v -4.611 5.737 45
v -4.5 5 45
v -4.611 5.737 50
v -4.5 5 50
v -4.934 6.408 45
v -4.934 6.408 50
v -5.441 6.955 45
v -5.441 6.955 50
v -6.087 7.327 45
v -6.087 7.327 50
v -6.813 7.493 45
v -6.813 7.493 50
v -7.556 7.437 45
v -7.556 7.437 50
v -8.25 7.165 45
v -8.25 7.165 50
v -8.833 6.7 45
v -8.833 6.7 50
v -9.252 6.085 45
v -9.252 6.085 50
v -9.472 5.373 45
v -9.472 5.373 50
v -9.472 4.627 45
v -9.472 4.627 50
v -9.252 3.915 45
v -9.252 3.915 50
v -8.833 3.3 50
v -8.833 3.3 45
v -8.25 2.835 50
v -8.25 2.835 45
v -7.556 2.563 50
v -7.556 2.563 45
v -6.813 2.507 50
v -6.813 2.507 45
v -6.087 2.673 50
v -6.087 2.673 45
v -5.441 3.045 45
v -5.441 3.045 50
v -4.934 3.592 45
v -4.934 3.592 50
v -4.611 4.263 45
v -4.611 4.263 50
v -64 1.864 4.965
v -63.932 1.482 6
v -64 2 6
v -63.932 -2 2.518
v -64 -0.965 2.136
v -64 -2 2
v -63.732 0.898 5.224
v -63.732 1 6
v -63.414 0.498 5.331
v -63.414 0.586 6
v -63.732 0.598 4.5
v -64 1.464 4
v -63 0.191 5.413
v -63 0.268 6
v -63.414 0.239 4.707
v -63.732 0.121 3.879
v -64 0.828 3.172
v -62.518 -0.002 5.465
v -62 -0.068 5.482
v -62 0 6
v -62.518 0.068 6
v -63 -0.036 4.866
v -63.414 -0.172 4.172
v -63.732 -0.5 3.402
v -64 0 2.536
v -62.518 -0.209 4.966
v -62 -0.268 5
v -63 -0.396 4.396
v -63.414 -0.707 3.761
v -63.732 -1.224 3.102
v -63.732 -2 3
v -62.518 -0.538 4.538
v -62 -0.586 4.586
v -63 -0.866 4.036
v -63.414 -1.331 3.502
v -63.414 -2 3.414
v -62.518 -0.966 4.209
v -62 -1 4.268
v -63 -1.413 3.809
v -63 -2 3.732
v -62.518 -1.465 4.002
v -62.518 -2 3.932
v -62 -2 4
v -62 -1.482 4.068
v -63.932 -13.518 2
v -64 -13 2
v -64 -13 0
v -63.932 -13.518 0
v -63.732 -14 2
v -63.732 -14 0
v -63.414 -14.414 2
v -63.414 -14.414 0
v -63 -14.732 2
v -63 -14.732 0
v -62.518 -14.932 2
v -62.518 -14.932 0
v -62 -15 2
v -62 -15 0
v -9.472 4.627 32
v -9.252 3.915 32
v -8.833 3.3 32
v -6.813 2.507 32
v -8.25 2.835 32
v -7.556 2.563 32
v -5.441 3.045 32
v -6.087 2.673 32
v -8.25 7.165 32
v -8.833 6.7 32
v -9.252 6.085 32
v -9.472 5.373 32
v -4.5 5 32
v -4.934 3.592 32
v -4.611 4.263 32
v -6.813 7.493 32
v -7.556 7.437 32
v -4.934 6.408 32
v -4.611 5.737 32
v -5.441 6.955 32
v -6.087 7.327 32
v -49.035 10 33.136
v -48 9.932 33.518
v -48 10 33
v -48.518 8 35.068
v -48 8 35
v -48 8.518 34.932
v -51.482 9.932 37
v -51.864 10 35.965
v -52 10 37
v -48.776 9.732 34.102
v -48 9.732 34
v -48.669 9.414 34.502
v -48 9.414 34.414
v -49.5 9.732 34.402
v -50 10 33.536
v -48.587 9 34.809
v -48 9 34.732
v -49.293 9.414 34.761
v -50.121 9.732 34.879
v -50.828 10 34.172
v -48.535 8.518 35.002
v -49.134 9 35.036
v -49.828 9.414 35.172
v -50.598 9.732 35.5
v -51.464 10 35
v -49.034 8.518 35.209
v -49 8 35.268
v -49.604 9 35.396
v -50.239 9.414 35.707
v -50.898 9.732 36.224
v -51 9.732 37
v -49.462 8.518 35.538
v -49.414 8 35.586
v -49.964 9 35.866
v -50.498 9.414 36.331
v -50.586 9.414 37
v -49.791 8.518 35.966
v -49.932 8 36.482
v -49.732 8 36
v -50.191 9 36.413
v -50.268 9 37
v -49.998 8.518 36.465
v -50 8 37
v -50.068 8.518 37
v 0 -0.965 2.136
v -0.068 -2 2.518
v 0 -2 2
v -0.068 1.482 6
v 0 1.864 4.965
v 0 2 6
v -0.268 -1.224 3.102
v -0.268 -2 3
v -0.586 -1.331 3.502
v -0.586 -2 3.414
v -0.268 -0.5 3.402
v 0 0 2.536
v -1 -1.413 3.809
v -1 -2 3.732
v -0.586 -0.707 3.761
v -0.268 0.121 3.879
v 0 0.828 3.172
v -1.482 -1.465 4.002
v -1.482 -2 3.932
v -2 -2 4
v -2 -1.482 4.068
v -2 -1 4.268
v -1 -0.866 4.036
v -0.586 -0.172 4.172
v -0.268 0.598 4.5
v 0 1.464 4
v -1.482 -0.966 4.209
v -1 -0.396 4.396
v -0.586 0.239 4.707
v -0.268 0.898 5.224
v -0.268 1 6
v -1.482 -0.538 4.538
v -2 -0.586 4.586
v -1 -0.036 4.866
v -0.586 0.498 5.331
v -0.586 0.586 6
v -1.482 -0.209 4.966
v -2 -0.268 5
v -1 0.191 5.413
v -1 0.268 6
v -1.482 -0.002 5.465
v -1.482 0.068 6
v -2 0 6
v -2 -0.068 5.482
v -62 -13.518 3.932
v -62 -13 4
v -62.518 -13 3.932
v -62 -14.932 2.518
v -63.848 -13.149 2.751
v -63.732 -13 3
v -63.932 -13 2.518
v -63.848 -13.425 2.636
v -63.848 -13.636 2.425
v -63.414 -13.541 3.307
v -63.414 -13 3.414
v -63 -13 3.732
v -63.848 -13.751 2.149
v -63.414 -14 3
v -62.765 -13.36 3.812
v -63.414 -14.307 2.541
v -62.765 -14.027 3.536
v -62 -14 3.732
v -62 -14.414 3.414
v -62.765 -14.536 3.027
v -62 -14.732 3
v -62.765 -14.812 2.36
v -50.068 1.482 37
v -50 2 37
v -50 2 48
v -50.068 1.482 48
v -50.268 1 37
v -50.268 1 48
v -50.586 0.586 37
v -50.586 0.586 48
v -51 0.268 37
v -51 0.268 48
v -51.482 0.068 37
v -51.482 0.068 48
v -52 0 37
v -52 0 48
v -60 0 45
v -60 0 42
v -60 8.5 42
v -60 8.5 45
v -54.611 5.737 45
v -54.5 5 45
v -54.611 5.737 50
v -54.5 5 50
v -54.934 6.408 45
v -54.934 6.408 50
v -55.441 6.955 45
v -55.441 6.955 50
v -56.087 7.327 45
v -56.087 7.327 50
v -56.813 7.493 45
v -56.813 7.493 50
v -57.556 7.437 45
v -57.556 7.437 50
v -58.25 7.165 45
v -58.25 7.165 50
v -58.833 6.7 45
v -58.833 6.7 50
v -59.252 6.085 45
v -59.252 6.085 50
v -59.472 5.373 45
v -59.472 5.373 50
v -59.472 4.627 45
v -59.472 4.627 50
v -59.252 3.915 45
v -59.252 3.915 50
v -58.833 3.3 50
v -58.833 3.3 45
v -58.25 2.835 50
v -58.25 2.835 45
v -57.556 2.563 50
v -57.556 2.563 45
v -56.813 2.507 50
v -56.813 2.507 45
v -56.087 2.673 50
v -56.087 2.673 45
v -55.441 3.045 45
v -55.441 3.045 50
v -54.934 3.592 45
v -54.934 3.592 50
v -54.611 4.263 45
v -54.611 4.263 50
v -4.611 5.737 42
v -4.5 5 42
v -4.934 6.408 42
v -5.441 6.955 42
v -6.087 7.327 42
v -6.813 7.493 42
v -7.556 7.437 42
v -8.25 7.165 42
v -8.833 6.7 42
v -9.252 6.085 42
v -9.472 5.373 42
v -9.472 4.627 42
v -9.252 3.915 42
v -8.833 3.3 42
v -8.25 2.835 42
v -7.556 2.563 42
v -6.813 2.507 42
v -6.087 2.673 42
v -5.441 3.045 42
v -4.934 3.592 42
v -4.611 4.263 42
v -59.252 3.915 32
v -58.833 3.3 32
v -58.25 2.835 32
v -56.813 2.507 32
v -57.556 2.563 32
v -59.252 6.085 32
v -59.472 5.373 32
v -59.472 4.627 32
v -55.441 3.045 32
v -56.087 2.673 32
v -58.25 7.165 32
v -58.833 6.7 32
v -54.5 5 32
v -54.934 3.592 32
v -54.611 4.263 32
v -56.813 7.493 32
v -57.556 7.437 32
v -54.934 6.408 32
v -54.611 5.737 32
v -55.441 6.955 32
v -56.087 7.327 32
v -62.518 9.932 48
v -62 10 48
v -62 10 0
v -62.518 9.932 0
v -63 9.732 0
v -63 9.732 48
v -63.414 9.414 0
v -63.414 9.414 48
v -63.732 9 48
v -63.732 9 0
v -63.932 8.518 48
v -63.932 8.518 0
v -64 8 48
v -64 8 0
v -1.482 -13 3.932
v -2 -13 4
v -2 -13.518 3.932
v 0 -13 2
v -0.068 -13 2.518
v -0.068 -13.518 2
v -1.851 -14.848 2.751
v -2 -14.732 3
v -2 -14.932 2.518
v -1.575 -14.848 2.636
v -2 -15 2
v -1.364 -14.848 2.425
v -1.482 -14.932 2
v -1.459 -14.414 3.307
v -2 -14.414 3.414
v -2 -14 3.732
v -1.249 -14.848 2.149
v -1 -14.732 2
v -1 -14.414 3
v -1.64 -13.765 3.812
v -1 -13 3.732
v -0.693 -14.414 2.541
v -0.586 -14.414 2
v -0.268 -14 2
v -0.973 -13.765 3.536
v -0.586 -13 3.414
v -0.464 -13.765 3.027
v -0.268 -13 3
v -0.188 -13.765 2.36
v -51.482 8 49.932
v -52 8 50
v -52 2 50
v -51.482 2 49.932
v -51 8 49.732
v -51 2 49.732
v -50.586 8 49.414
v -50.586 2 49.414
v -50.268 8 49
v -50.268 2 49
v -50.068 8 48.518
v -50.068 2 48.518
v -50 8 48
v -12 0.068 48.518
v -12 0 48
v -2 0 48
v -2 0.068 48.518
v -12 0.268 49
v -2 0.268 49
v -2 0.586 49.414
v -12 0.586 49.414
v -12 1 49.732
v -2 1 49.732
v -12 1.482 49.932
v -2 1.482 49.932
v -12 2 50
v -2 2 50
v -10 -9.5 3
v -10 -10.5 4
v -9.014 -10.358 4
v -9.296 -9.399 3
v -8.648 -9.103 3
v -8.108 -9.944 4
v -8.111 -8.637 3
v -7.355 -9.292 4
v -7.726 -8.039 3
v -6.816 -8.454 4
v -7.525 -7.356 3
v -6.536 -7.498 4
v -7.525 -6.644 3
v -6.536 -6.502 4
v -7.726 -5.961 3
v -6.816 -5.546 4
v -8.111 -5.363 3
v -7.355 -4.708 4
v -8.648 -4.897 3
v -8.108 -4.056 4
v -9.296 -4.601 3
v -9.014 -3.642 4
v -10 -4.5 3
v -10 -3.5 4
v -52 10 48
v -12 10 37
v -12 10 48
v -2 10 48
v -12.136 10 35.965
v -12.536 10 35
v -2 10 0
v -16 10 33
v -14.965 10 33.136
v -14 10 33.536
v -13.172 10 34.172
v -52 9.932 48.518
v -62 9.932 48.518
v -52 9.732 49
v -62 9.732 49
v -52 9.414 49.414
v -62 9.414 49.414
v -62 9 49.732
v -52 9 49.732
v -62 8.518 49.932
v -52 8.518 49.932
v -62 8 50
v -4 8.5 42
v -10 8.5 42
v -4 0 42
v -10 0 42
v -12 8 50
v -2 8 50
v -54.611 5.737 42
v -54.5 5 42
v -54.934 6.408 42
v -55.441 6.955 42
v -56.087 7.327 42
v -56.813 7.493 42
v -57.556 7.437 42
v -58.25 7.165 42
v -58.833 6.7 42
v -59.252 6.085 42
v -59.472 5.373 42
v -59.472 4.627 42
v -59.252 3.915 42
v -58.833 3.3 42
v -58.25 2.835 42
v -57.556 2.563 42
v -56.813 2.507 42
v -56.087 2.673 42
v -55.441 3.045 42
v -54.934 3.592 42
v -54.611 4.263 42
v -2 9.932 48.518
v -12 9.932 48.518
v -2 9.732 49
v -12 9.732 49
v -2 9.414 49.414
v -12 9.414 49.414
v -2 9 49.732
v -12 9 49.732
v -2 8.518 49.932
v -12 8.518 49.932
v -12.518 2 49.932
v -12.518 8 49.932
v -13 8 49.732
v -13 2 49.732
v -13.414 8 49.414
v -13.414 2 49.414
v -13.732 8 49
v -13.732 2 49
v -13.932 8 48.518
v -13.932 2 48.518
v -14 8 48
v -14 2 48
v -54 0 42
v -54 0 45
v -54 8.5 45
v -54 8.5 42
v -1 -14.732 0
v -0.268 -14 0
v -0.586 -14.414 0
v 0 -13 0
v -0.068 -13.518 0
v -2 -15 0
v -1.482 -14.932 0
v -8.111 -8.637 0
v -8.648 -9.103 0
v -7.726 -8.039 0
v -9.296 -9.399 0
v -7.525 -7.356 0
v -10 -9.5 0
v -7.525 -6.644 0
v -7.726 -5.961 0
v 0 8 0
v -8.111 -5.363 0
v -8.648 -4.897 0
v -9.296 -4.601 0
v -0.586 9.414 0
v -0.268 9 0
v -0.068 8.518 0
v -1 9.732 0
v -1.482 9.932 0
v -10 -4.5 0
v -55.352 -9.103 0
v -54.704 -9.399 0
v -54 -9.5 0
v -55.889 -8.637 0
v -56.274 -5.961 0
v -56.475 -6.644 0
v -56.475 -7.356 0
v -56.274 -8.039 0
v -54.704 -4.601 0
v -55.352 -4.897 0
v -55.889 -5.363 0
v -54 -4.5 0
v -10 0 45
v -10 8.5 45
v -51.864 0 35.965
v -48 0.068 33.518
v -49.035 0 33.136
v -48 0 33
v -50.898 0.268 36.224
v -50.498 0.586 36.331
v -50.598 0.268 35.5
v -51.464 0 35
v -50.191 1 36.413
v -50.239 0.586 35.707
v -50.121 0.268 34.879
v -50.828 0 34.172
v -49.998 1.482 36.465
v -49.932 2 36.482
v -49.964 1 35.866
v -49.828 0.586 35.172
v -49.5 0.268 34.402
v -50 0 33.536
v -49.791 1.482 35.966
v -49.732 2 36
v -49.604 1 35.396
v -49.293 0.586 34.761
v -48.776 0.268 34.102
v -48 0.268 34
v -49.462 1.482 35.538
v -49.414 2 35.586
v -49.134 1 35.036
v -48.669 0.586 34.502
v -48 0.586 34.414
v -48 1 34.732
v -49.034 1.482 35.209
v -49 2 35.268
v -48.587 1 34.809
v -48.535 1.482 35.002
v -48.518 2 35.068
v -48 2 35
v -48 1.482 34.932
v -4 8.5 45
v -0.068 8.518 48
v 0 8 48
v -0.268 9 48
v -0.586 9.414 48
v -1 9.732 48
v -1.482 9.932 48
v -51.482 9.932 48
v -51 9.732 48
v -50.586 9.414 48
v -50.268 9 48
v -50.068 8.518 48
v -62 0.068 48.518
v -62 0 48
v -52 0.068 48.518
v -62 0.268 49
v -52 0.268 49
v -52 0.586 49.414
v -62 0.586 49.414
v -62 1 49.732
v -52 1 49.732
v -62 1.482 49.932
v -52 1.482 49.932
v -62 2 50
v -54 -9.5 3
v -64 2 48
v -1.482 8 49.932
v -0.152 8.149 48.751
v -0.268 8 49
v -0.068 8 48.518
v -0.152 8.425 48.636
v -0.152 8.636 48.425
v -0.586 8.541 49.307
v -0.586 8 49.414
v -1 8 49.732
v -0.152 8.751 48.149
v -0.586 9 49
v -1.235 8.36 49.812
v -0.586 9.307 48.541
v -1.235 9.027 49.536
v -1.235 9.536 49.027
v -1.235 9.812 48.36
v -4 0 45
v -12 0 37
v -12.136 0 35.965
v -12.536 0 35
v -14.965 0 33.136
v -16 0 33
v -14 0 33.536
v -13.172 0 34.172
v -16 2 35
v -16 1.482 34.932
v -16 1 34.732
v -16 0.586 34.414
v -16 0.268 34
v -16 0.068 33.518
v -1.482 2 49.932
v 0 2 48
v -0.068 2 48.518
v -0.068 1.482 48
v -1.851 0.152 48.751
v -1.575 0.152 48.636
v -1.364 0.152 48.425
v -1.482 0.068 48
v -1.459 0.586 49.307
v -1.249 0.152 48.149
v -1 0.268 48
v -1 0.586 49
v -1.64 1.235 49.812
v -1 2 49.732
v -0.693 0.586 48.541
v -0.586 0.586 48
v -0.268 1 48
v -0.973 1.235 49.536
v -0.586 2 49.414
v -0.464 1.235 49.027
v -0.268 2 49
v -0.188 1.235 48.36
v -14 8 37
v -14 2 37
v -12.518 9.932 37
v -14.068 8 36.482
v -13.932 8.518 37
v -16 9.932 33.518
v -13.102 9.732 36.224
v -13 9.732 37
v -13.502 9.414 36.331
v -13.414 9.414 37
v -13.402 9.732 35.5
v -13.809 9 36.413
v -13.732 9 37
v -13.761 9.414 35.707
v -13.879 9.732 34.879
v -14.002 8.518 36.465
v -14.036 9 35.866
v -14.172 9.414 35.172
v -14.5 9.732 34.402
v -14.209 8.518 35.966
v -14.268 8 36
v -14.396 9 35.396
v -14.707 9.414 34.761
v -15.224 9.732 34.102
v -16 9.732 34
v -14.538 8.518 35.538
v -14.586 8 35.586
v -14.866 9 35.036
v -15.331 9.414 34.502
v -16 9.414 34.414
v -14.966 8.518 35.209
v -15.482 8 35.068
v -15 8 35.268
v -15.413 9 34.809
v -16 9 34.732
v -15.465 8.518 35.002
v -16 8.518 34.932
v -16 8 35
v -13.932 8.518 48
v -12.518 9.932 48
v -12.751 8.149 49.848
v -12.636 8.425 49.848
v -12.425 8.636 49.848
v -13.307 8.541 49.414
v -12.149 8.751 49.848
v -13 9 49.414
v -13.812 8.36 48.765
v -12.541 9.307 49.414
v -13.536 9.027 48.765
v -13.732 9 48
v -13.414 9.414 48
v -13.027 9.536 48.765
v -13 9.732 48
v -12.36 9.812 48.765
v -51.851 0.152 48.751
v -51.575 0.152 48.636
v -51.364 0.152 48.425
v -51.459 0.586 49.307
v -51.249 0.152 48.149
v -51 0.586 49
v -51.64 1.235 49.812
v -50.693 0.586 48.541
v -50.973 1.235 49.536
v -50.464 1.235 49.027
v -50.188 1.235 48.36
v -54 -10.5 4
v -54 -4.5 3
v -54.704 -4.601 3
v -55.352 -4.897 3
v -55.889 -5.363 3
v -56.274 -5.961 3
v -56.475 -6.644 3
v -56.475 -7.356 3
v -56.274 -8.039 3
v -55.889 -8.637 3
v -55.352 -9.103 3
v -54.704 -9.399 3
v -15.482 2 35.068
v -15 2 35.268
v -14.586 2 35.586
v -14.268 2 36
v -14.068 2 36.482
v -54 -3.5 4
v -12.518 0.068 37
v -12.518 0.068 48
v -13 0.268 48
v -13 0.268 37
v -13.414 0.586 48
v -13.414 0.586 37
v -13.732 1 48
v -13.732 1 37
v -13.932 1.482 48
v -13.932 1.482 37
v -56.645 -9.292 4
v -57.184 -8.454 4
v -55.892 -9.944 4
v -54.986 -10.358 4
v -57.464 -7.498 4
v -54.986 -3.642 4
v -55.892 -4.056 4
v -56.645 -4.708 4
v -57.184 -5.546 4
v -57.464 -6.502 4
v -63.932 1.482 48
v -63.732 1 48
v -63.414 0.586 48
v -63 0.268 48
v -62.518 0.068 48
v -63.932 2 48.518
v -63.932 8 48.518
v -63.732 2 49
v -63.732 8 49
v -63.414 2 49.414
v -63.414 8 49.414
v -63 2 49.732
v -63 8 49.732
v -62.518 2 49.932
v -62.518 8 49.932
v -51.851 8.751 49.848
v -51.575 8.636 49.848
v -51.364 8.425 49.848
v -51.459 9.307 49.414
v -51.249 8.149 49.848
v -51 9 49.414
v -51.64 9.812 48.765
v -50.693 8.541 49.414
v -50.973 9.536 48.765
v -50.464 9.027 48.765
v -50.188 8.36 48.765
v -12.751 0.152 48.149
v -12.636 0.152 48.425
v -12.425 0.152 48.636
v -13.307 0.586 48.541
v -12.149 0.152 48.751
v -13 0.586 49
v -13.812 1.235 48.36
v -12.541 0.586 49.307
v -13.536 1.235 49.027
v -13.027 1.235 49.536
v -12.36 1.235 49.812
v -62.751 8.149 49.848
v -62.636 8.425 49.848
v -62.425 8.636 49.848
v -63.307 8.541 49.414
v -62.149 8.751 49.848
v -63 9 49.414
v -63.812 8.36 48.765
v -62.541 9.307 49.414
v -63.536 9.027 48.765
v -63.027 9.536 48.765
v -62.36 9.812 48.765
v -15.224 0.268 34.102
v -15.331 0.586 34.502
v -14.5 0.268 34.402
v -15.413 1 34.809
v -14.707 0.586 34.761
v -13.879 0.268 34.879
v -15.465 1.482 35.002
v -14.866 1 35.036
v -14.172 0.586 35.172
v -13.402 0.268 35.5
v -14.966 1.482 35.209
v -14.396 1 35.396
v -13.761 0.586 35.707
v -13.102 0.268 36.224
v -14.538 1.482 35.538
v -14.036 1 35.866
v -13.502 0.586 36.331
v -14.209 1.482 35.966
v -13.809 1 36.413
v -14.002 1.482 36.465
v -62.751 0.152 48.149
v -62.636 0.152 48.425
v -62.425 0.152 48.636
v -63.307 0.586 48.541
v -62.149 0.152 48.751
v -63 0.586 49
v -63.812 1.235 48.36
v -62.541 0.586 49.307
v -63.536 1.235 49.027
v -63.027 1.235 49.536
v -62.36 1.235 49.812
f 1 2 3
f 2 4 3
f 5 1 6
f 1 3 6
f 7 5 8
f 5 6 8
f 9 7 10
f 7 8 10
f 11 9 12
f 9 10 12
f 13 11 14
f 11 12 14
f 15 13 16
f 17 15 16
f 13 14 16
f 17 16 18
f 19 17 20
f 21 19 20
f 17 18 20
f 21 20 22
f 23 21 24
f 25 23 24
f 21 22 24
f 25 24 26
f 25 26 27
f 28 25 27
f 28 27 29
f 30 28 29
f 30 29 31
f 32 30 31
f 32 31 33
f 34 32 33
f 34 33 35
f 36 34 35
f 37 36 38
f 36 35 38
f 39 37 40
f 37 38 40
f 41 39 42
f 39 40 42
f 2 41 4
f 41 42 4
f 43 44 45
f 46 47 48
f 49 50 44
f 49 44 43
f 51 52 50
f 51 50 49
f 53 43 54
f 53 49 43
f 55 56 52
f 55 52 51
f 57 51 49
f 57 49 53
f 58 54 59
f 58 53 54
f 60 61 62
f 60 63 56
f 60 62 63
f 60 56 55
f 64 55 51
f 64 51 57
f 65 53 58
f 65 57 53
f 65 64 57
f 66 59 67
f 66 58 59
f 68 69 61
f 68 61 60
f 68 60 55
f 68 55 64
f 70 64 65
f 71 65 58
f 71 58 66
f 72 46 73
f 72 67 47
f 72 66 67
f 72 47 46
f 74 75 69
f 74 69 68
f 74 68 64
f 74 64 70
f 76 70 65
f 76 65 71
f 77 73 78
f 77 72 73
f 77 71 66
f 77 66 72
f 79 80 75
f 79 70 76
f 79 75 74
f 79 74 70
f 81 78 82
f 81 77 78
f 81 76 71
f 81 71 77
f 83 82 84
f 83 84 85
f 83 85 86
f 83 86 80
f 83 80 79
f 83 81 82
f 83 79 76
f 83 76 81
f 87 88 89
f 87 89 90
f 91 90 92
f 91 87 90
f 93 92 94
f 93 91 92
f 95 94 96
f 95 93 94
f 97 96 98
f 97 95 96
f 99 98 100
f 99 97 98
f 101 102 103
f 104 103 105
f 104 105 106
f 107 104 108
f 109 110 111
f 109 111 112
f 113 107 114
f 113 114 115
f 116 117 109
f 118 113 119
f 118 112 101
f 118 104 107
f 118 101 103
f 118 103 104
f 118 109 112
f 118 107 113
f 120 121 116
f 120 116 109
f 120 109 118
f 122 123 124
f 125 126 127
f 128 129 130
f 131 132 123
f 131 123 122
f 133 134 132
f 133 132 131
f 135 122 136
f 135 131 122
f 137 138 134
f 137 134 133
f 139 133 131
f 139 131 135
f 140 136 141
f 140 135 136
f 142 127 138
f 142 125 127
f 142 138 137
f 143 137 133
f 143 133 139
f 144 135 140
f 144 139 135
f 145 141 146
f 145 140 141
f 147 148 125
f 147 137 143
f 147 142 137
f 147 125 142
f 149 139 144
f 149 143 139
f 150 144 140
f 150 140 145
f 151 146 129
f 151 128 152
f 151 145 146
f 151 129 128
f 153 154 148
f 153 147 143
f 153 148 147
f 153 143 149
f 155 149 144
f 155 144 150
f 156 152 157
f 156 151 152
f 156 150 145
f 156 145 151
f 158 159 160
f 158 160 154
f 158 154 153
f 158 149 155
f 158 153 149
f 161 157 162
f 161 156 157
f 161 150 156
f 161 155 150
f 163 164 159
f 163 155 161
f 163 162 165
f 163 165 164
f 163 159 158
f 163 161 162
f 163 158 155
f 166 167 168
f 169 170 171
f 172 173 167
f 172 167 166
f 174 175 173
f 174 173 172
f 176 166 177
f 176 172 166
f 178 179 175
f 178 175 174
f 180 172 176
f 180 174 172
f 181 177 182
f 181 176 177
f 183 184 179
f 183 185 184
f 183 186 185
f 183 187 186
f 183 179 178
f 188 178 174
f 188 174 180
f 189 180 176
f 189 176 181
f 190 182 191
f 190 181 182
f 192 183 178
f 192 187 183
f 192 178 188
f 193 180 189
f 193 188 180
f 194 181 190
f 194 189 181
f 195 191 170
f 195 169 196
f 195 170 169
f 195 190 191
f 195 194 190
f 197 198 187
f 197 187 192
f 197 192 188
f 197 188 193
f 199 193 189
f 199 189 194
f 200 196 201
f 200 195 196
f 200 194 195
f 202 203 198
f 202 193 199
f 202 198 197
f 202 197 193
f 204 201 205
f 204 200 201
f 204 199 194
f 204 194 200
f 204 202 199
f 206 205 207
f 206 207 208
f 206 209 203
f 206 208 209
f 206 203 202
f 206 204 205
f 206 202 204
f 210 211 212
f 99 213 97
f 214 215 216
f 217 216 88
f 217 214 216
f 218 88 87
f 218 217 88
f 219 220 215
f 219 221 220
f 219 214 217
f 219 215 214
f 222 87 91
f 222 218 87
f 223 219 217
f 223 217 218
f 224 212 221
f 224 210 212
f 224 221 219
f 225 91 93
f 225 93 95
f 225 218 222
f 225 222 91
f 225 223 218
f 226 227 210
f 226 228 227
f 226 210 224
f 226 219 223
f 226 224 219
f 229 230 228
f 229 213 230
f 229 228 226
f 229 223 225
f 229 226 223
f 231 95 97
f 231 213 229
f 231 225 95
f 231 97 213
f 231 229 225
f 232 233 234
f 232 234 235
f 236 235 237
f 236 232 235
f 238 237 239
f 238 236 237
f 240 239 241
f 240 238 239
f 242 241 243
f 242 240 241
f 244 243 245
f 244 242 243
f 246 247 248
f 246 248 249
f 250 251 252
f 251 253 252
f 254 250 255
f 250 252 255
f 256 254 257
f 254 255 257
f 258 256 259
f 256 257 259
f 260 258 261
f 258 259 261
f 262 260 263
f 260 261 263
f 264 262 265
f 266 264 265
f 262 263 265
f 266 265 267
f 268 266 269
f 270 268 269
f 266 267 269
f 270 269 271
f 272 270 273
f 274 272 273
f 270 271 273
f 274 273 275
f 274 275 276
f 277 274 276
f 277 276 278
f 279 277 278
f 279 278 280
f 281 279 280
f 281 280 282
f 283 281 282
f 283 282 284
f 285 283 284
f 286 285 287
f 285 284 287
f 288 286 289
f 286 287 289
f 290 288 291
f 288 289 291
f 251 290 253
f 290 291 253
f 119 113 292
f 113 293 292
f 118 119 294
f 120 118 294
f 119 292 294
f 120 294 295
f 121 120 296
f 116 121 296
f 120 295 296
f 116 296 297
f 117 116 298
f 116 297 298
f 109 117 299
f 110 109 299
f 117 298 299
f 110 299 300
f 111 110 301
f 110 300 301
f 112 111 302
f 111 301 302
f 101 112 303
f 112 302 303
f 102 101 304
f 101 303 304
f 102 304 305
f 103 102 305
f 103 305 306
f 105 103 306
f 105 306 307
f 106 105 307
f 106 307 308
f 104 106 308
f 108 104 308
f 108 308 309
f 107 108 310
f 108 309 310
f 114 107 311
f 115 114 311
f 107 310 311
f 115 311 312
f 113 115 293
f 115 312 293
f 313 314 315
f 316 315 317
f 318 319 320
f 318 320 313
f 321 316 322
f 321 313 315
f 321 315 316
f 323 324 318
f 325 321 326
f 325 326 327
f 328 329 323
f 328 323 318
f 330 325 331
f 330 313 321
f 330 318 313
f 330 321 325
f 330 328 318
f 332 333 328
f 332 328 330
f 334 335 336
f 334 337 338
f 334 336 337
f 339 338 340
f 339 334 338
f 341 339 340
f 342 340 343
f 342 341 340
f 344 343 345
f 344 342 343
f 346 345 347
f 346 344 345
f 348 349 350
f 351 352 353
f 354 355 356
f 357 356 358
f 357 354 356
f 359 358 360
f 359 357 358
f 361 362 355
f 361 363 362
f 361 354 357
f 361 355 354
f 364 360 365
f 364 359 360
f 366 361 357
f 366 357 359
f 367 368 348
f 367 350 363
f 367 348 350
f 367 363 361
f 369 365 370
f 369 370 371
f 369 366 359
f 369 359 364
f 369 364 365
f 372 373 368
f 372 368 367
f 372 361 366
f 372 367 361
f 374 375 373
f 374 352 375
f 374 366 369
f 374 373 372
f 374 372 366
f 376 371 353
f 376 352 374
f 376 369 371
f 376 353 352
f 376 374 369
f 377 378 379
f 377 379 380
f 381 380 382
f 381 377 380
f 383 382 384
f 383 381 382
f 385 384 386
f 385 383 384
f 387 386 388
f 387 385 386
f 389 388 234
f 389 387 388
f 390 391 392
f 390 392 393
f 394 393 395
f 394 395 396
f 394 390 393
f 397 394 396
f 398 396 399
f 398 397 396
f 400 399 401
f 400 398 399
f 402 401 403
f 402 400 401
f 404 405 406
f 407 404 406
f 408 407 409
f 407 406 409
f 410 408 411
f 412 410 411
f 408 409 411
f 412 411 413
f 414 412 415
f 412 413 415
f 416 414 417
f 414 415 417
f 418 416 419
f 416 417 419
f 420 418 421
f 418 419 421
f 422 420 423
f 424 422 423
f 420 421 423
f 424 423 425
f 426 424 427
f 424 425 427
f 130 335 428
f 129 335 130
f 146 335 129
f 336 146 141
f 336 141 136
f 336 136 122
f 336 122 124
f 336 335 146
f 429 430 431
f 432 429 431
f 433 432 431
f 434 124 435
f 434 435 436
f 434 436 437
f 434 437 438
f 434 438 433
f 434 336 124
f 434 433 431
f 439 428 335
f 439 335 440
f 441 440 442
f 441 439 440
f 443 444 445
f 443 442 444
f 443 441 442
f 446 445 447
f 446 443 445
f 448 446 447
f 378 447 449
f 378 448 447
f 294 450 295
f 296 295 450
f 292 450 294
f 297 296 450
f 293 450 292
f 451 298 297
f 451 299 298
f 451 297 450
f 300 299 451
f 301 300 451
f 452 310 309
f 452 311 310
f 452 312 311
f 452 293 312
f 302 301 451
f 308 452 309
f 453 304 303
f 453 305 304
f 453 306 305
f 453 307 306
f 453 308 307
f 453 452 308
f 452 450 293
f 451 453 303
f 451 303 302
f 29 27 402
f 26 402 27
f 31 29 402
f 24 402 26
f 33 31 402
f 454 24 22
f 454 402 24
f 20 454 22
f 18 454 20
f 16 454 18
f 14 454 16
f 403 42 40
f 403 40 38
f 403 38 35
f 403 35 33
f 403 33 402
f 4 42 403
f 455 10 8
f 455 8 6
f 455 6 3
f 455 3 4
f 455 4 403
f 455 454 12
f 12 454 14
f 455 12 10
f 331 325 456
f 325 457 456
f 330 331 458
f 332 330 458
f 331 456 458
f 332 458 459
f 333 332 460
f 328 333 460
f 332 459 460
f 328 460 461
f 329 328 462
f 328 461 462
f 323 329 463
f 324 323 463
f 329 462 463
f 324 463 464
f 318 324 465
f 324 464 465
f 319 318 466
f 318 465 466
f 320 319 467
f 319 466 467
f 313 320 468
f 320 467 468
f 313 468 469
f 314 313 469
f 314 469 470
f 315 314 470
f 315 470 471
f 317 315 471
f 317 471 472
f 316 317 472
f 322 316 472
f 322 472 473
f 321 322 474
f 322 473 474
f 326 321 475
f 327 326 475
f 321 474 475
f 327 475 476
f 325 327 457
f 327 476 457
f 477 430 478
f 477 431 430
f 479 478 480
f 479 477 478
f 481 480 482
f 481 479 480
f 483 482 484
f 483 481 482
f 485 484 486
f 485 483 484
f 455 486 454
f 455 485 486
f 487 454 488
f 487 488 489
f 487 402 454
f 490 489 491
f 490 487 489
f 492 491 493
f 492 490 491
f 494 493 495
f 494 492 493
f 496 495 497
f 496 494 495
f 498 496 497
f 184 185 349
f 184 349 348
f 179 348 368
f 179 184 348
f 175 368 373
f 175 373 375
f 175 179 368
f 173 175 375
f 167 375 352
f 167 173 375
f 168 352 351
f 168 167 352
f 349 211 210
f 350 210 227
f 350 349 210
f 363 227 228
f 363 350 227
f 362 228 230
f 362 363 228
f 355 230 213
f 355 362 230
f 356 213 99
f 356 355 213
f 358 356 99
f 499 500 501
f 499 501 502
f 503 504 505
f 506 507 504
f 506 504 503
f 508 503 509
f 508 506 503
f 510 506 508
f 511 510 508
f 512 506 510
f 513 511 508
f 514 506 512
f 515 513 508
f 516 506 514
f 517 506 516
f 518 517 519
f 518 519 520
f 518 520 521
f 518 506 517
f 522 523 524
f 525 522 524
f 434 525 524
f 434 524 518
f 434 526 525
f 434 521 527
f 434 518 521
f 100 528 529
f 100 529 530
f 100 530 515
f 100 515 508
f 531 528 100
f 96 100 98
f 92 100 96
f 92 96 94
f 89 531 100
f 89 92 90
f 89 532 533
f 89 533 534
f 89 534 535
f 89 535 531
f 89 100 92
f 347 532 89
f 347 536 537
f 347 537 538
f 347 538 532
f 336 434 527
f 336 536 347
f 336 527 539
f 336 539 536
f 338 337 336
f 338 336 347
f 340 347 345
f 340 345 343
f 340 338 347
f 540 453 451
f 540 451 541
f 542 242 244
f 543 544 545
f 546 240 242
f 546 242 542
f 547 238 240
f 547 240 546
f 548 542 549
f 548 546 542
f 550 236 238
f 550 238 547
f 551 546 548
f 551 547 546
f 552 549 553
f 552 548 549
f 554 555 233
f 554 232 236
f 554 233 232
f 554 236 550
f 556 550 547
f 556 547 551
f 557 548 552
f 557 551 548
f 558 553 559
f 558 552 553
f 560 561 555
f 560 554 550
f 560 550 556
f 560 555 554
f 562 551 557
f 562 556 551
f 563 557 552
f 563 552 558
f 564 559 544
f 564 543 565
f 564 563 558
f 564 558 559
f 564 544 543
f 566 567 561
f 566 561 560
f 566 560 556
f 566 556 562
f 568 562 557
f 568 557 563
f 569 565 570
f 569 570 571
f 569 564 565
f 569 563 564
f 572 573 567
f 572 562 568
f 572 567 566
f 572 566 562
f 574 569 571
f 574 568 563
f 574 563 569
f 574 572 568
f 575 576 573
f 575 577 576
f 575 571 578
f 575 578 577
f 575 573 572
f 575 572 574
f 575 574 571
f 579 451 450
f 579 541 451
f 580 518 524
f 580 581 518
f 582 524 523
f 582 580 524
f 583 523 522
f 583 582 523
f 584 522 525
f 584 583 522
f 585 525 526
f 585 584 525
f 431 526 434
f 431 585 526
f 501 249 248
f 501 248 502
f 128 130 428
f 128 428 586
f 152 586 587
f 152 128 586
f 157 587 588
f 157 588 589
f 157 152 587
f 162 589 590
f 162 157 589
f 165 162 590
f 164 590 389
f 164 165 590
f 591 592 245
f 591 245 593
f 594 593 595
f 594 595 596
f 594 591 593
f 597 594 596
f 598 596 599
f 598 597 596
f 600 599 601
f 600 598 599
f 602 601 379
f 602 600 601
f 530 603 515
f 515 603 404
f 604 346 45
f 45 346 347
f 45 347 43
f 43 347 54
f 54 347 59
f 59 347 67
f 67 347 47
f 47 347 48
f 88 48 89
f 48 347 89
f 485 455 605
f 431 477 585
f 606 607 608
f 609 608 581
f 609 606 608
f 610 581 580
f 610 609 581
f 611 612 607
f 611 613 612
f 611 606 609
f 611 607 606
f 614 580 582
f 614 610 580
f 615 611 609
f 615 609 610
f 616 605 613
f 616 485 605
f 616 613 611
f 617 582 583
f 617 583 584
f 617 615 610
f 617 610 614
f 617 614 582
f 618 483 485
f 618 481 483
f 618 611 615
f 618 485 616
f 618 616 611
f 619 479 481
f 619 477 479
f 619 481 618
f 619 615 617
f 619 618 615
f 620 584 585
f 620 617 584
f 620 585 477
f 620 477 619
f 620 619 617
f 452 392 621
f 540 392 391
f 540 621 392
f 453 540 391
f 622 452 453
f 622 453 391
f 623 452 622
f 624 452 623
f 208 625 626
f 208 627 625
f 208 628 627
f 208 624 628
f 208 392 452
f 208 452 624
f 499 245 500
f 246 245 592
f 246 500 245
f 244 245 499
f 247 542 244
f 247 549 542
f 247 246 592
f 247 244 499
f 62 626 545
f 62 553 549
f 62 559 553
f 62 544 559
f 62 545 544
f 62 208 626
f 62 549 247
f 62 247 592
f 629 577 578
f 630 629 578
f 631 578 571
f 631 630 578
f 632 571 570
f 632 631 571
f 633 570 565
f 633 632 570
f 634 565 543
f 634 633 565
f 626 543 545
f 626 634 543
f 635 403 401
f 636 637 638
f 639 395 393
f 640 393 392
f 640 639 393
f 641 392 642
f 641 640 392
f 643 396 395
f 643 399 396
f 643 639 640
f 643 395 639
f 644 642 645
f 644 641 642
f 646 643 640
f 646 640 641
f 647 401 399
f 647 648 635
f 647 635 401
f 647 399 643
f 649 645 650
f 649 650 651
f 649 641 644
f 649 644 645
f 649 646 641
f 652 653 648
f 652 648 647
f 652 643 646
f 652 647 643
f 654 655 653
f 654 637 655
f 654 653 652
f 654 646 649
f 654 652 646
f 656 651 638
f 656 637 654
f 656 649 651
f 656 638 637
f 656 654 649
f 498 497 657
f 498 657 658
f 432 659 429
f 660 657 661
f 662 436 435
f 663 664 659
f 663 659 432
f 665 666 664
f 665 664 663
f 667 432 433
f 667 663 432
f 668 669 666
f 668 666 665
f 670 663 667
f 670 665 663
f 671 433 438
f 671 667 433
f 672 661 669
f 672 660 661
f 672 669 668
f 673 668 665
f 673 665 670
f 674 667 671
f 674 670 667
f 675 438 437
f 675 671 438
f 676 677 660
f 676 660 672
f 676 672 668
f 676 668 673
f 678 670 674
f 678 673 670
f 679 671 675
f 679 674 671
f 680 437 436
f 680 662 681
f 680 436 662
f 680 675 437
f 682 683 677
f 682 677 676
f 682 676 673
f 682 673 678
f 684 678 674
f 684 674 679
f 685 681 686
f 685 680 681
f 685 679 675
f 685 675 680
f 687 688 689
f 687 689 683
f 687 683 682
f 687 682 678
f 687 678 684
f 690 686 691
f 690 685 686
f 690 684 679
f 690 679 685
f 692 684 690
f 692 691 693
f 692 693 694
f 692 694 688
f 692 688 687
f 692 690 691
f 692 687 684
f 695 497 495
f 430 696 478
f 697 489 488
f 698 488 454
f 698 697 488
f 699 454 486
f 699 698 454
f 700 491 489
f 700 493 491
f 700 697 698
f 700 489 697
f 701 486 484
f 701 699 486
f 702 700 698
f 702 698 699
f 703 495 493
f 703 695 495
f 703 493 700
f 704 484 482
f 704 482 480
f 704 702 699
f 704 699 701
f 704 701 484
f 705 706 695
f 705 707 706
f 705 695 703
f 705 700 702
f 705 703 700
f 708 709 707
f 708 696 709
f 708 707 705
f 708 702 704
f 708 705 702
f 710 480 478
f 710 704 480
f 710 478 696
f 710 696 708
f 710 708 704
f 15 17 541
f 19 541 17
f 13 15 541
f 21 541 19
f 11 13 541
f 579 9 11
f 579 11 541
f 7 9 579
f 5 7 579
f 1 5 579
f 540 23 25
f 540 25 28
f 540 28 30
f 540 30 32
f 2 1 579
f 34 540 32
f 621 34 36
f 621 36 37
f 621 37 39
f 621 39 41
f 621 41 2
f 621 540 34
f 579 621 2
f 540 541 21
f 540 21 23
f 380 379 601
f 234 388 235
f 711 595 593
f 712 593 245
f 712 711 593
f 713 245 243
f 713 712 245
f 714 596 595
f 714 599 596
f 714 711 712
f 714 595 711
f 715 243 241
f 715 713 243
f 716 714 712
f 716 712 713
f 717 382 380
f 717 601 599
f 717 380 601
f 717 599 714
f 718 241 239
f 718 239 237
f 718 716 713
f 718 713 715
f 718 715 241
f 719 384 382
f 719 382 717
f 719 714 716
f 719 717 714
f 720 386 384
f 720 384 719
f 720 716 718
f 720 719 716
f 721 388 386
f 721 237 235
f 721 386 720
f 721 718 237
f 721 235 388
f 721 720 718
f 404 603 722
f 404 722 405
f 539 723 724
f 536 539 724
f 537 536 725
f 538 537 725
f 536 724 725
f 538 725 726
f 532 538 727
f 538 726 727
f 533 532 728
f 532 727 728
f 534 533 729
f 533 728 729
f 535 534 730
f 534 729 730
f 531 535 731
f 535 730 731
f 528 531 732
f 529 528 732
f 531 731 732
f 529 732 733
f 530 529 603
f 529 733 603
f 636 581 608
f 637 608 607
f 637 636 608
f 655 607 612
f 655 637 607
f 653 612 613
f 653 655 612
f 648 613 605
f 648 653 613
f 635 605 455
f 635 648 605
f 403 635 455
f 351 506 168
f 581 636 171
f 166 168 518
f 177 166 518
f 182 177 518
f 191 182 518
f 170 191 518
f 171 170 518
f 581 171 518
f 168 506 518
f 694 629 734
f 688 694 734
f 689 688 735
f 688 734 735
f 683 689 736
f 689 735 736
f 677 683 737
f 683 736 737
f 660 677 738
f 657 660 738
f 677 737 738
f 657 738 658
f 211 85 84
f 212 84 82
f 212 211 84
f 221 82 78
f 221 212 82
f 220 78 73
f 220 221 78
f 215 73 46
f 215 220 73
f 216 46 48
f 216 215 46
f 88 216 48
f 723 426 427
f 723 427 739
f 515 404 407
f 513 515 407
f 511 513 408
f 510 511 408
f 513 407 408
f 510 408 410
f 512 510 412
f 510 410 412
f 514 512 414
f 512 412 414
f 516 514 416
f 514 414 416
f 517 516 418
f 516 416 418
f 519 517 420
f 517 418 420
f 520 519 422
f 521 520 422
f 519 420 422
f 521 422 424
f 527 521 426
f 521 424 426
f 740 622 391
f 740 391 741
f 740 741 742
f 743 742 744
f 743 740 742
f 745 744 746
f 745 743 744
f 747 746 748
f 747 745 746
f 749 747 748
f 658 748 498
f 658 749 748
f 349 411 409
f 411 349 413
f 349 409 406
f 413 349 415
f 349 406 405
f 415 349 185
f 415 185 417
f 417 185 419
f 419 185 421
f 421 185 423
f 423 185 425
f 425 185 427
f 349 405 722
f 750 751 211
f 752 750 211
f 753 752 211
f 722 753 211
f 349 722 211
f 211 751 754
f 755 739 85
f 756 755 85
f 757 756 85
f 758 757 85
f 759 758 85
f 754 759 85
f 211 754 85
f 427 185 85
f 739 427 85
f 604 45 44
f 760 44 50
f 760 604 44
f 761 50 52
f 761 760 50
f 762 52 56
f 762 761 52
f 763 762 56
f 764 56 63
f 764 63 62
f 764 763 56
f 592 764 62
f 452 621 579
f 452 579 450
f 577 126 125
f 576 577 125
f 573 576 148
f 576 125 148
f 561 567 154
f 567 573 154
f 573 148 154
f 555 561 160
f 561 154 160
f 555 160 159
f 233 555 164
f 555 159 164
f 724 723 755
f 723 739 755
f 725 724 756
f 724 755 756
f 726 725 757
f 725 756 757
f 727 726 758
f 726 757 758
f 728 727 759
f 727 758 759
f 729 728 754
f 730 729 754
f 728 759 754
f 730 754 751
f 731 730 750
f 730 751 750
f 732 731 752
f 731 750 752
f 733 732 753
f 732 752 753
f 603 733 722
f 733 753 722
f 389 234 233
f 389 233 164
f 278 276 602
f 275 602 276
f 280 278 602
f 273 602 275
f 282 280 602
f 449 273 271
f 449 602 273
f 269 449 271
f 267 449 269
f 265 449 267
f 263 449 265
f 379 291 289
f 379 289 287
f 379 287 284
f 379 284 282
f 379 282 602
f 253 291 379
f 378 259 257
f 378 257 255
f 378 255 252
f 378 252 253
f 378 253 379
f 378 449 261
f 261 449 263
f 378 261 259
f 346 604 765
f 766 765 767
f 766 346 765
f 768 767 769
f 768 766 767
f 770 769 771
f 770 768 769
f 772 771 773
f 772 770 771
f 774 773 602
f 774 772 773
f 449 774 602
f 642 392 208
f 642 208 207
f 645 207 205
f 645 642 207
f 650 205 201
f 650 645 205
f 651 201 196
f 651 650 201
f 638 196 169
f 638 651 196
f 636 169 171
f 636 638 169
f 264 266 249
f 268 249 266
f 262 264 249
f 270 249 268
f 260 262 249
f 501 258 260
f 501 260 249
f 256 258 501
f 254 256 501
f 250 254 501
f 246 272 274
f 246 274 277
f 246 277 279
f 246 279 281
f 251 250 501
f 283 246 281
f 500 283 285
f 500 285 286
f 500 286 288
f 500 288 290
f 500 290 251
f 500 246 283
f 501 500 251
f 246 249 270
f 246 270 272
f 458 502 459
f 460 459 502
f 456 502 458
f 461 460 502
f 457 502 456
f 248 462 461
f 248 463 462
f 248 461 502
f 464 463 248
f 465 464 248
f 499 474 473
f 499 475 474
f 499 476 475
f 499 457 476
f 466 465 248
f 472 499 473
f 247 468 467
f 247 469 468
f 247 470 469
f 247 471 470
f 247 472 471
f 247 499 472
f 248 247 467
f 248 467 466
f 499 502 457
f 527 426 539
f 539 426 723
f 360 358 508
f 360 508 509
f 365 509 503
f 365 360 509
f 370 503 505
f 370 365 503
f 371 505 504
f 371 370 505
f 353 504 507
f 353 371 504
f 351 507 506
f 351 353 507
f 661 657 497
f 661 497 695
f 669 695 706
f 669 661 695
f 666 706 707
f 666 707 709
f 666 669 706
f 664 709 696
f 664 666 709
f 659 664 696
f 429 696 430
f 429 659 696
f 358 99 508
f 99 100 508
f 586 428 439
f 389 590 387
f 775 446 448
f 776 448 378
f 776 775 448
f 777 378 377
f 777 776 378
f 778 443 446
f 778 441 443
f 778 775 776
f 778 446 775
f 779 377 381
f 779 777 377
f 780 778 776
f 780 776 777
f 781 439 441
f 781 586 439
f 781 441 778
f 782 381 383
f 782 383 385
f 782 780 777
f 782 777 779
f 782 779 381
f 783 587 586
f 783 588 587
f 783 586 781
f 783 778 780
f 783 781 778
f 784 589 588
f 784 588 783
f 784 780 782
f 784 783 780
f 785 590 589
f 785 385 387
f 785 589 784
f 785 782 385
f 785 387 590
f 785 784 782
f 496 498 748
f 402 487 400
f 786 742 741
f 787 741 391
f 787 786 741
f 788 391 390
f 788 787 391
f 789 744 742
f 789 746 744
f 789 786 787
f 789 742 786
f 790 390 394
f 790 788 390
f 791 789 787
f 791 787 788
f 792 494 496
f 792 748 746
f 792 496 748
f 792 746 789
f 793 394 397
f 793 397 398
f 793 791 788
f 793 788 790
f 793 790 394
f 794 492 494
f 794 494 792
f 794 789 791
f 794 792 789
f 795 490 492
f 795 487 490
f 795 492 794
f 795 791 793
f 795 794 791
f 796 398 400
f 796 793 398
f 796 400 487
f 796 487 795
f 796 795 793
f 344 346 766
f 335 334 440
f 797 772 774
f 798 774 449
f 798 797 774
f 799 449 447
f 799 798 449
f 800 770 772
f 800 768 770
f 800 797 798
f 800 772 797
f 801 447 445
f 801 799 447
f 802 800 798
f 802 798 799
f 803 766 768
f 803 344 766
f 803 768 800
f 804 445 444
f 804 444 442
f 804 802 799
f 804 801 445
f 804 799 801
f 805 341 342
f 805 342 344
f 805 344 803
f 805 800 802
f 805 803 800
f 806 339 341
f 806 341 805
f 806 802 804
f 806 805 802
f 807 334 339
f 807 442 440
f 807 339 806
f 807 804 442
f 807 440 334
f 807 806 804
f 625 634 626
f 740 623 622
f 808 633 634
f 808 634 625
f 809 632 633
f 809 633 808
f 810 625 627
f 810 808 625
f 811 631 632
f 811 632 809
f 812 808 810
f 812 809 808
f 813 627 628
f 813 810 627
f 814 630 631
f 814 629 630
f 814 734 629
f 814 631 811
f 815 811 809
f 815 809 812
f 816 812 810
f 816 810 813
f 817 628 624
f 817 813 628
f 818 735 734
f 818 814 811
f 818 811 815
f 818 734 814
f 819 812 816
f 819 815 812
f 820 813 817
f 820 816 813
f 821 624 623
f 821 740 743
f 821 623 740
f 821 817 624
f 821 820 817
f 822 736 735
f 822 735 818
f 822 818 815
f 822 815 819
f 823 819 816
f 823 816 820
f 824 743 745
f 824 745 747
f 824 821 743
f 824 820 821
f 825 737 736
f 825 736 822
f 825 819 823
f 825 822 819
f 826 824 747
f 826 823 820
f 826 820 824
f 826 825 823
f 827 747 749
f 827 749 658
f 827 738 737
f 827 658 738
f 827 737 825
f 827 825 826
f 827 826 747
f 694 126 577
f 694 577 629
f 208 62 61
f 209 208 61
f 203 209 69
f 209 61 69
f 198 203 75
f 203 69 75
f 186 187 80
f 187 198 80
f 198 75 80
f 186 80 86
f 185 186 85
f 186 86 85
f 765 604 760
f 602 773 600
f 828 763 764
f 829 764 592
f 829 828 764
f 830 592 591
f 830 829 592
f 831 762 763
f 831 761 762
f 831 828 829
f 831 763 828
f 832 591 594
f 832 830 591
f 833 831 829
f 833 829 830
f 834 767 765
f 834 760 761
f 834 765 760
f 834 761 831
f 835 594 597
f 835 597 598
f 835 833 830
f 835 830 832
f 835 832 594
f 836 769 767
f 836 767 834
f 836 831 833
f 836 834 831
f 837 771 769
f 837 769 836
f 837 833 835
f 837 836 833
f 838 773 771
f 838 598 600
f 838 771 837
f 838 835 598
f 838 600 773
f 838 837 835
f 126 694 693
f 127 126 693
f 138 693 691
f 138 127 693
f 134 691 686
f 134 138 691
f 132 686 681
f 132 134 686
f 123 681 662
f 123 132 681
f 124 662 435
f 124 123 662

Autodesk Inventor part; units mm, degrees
ref_plane "YZ Plane" through (0, 0, 0) normal (1, 0, 0) x (0, 1, 0)
ref_plane "XZ Plane" through (0, 0, 0) normal (0, 1, 0) x (-1, 0, 0)
ref_plane "XY Plane" through (0, 0, 0) normal (0, 0, 1) x (1, 0, 0)
sketch "Sketch1" plane through (0, 0, 0) normal (0, 0, 1) x (1, 0, 0)
  line L0 (-64, 10) -> (0, 10)
  line L1 (0, 10) -> (0, 0)
  line L2 (0, 0) -> (-64, 0)
  line L3 (-64, 0) -> (-64, 10)
  dimension "d0" = 64
  dimension "d1" = 10
extrude "Extrusion1" add sketch "Sketch1" along normal blind 50
sketch "Sketch2" plane through (0, 0, 50) normal (0, 0, 1) x (1, 0, 0)
  line L0 (0, 10) -> (-64, 10) projected
  line L1 (-64, 10) -> (-64, 0) projected
  line L2 (-64, 0) -> (0, 0) projected
  line L3 (0, 0) -> (0, 10) projected
  circle A0 centre (-57, 5) radius 2.5
  circle A1 centre (-7, 5) radius 2.5
  line L4 (-32, 17) -> (-32, -12)
  line L5 (-64, 10) -> (-64, 0) projected
  line L6 (-64, 5) -> (0, 5)
  dimension "d4" = 50
  dimension "d5" = 5
  dimension "d6" = 32
extrude "Extrusion2" cut sketch "Sketch2" against normal blind 18 contours L6 A1 | A1 L6 | L6 A0 | A0 L6
sketch "Sketch3" plane through (0, 0, 50) normal (0, 0, 1) x (1, 0, 0)
  circle A0 centre (-7, 5) radius 2.5 projected
  circle A1 centre (-57, 5) radius 2.5 projected
  line L0 (0, 10) -> (-64, 10) projected
  line L1 (-64, 10) -> (-64, 0) projected
  line L2 (-64, 0) -> (0, 0) projected
  line L3 (0, 0) -> (0, 10) projected
  line L4 (-64, 0) -> (0, 0) projected
  line L5 (-50, 10) -> (-14, 10)
  line L6 (-14, 10) -> (-14, 0)
  line L7 (-14, 0) -> (-50, 0)
  line L8 (-50, 0) -> (-50, 10)
  dimension "d9" = 14
  dimension "d10" = 14
ref_plane "Work Plane1" through (-32, 0, 0) normal (-1, 0, 0) x (0, 0, 1)
extrude "Extrusion3" cut sketch "Sketch3" against normal blind 15 contours L6 L2 L8 L0
sketch "Sketch4" plane through (-64, 0, 0) normal (0, -1, 0) x (1, 0, 0)
  line L0 (14, 35) -> (14, 50) projected
  line L1 (0, 50) -> (14, 50) projected
  line L2 (0, 0) -> (0, 50) projected
  line L3 (64, 0) -> (0, 0) projected
  line L4 (64, 0) -> (64, 50) projected
  line L5 (50, 50) -> (64, 50) projected
  line L6 (50, 50) -> (50, 35) projected
  line L7 (50, 35) -> (14, 35) projected
  line L8 (9.5, 50) -> (9.5, 32) projected
  line L9 (4.5, 50) -> (4.5, 32) projected
sketch "Sketch5" plane through (-64, 0, 0) normal (0, -1, 0) x (1, 0, 0)
  line L0 (4, 45) -> (10, 45)
  line L1 (10, 45) -> (10, 42)
  line L2 (10, 42) -> (4, 42)
  line L3 (4, 42) -> (4, 45)
  line L4 (4.5, 50) -> (9.5, 50) projected
  line L5 (7, 50) -> (7, 38)
  line L6 (0, 50) -> (14, 50) projected
  point P0 (64, 0)
  point P1 (7, 50)
  dimension "d13" = 6
  dimension "d14" = 3
  dimension "d15" = 5
extrude "Extrusion4" cut sketch "Sketch5" against normal blind 8.5
mirror "Mirror1" about plane through (-32, 0, 0) normal (-1, 0, 0) of "Extrusion4"
sketch "Sketch6" plane through (0, 0, 0) normal (0, 0, -1) x (-1, 0, 0)
  line L0 (64, 10) -> (0, 10) projected
  line L1 (0, 10) -> (0, 0) projected
  line L2 (0, 0) -> (64, 0) projected
  line L3 (64, 0) -> (64, 10) projected
  line L4 (0, 0) -> (64, 0)
  line L5 (64, 0) -> (64, -15)
  line L6 (64, -15) -> (0, -15)
  line L7 (0, -15) -> (0, 0)
  dimension "d30" = 15
extrude "Extrusion5" add sketch "Sketch6" against normal blind 4 contours L5 L6 L7 L2
sketch "Sketch7" plane through (0, 0, 4) normal (0, 0, 1) x (1, 0, 0)
  line L0 (0, -15) -> (0, 0) projected
  line L1 (-64, 0) -> (0, 0) projected
  line L2 (-64, 0) -> (-64, -15) projected
  line L3 (-64, -15) -> (0, -15) projected
  line L4 (-54, -7) -> (-10, -7) construction
  line L5 (-54, -9.5) -> (-10, -9.5)
  line L6 (-10, -4.5) -> (-54, -4.5)
  arc A0 (-54, -4.5) -> (-54, -9.5) centre (-54, -7) ccw
  arc A1 (-10, -9.5) -> (-10, -4.5) centre (-10, -7) ccw
  point P0 (-32, -7)
  dimension "d20" = 5
  dimension "d22" = 10
  dimension "d23" = 10
  dimension "d24" = 7
extrude "Extrusion6" cut sketch "Sketch7" against normal through all contours A0 L6 A1 L5
chamfer "Chamfer1" distance 1 angle 45 4 edges at (-32, -4.5, 4) (-7.5, -7, 4) (-32, -9.5, 4) (-56.5, -7, 4)
fillet "Fillet1" radius 2 26 edges at (-64, 10, 25) (-50, 10, 42.5) (-57, 10, 50) (-50, 5, 50) (-64, 5, 50) (-64, 0, 27) (-32, 10, 35) (-14, 10, 42.5) (-14, 5, 50) (-7, 10, 50) (0, 5, 50) (0, 10, 25) (-14, 5, 35) (-32, 0, 35) (-50, 5, 35) (-57, 0, 50) (-50, 0, 42.5) (-14, 0, 42.5) (-32, 0, 4) (0, -7.5, 4) (-32, -15, 4) (-64, -7.5, 4) (-64, -15, 2) (0, -15, 2) (-7, 0, 50) (0, 0, 27)
properties part number "soporte0.2"
